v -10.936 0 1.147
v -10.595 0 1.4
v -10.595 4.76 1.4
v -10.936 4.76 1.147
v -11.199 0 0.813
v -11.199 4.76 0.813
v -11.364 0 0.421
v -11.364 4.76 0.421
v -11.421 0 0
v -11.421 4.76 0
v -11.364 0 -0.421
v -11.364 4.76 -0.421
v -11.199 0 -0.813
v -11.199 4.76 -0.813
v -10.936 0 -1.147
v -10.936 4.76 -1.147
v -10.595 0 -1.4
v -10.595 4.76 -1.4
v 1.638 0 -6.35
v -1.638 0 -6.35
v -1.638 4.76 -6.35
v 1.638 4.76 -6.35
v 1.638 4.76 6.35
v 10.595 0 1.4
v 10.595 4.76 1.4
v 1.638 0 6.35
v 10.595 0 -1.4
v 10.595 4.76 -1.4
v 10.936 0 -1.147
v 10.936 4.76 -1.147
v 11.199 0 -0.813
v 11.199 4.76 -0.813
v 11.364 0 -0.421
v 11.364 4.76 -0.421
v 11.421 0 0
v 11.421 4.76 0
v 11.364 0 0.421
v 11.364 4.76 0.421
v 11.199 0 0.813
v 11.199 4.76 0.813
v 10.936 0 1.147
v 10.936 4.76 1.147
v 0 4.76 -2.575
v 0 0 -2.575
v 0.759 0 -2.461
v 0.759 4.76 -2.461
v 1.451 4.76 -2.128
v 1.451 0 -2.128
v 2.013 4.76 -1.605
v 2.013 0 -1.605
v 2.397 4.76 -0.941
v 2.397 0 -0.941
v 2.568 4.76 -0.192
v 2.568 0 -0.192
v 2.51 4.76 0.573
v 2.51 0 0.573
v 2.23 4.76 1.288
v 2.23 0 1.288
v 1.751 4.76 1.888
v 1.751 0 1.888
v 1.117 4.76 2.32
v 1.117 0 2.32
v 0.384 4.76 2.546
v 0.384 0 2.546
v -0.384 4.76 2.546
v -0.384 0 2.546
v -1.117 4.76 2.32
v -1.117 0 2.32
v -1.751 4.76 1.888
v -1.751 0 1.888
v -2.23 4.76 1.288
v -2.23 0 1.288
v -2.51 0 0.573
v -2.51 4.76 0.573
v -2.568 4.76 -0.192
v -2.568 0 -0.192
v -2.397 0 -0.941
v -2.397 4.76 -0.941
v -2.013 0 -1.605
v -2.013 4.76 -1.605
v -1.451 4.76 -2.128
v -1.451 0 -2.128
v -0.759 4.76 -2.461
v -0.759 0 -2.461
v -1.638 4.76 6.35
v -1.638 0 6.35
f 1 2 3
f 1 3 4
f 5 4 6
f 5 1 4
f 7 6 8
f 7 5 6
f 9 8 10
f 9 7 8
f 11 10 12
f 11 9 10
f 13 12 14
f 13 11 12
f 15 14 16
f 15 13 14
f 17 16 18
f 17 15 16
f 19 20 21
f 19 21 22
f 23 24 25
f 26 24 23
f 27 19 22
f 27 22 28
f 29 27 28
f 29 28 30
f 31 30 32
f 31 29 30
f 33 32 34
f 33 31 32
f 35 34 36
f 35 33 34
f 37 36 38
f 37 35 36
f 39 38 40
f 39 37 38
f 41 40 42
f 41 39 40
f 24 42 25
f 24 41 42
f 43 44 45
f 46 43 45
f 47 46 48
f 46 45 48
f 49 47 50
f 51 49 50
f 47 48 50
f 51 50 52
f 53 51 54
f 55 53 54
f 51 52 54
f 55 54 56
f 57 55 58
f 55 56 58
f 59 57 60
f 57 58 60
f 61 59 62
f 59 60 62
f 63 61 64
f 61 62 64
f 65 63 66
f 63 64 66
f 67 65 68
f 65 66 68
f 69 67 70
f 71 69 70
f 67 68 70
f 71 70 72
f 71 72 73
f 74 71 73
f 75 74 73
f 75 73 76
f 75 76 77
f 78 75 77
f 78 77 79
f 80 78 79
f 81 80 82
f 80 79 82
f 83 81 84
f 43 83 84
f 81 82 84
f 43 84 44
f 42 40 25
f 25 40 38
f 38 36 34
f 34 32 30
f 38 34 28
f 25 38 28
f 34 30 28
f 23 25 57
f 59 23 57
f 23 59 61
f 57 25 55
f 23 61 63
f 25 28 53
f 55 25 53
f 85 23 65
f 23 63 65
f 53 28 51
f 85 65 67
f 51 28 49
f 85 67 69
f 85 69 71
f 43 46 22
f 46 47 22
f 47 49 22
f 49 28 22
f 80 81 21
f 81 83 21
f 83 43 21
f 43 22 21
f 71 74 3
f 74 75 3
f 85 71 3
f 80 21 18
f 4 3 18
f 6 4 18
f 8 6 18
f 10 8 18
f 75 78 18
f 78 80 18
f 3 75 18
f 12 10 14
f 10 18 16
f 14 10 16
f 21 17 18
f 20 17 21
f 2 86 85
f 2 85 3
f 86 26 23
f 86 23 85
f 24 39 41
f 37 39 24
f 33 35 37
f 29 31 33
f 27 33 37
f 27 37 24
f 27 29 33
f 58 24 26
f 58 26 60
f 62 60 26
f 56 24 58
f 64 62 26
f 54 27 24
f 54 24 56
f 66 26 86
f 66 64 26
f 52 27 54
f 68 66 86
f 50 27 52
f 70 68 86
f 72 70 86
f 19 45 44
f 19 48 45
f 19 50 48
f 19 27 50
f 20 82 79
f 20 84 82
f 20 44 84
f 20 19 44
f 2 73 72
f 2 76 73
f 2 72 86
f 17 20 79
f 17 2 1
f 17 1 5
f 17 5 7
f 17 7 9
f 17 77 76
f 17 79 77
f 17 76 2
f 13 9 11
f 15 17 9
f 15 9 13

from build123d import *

# Parameters (mm, degrees)
AUFSATZ_LINEAR_AUSTRAGEN1_DEPTH = 4.76
SKIZZE2_R                       = 2.575
SCHNITT_LINEAR_AUSTRAGEN2_DEPTH = 4.76


with BuildPart() as part:
    # Skizze1 → Aufsatz-Linear austragen1 (new body)
    with BuildSketch(Plane(origin=(0, 0, 0), x_dir=(1, 0, 0), z_dir=(0, 1, 0))):
        with BuildLine():
            Line((1.637816376, 6.35), (10.594588216, 1.400399316))
            ThreePointArc((10.594588216, 1.400399316), (11.420713706, 0), (10.594588216, -1.400399316))
            Line((10.594588216, -1.400399316), (1.637816376, -6.35))
            Line((1.637816376, -6.35), (-1.637816376, -6.35))
            Line((-1.637816376, -6.35), (-10.594588216, -1.400399316))
            ThreePointArc((-10.594588216, -1.400399316), (-11.420713706, 0), (-10.594588216, 1.400399316))
            Line((-10.594588216, 1.400399316), (-1.637816376, 6.35))
            Line((-1.637816376, 6.35), (1.637816376, 6.35))
        make_face()
    extrude(amount=AUFSATZ_LINEAR_AUSTRAGEN1_DEPTH)

    # Skizze2 → Schnitt-Linear austragen2 (cut)
    with BuildSketch(Plane(origin=(0, 0, 0), x_dir=(-1, 0, 0), z_dir=(0, -1, 0))):
        with Locations(Location((0, 0, 0), (0, 0, 90))):  # turned: the seam where the file's is
            Circle(SKIZZE2_R)
    extrude(amount=-SCHNITT_LINEAR_AUSTRAGEN2_DEPTH, mode=Mode.SUBTRACT)


solid = part.part
